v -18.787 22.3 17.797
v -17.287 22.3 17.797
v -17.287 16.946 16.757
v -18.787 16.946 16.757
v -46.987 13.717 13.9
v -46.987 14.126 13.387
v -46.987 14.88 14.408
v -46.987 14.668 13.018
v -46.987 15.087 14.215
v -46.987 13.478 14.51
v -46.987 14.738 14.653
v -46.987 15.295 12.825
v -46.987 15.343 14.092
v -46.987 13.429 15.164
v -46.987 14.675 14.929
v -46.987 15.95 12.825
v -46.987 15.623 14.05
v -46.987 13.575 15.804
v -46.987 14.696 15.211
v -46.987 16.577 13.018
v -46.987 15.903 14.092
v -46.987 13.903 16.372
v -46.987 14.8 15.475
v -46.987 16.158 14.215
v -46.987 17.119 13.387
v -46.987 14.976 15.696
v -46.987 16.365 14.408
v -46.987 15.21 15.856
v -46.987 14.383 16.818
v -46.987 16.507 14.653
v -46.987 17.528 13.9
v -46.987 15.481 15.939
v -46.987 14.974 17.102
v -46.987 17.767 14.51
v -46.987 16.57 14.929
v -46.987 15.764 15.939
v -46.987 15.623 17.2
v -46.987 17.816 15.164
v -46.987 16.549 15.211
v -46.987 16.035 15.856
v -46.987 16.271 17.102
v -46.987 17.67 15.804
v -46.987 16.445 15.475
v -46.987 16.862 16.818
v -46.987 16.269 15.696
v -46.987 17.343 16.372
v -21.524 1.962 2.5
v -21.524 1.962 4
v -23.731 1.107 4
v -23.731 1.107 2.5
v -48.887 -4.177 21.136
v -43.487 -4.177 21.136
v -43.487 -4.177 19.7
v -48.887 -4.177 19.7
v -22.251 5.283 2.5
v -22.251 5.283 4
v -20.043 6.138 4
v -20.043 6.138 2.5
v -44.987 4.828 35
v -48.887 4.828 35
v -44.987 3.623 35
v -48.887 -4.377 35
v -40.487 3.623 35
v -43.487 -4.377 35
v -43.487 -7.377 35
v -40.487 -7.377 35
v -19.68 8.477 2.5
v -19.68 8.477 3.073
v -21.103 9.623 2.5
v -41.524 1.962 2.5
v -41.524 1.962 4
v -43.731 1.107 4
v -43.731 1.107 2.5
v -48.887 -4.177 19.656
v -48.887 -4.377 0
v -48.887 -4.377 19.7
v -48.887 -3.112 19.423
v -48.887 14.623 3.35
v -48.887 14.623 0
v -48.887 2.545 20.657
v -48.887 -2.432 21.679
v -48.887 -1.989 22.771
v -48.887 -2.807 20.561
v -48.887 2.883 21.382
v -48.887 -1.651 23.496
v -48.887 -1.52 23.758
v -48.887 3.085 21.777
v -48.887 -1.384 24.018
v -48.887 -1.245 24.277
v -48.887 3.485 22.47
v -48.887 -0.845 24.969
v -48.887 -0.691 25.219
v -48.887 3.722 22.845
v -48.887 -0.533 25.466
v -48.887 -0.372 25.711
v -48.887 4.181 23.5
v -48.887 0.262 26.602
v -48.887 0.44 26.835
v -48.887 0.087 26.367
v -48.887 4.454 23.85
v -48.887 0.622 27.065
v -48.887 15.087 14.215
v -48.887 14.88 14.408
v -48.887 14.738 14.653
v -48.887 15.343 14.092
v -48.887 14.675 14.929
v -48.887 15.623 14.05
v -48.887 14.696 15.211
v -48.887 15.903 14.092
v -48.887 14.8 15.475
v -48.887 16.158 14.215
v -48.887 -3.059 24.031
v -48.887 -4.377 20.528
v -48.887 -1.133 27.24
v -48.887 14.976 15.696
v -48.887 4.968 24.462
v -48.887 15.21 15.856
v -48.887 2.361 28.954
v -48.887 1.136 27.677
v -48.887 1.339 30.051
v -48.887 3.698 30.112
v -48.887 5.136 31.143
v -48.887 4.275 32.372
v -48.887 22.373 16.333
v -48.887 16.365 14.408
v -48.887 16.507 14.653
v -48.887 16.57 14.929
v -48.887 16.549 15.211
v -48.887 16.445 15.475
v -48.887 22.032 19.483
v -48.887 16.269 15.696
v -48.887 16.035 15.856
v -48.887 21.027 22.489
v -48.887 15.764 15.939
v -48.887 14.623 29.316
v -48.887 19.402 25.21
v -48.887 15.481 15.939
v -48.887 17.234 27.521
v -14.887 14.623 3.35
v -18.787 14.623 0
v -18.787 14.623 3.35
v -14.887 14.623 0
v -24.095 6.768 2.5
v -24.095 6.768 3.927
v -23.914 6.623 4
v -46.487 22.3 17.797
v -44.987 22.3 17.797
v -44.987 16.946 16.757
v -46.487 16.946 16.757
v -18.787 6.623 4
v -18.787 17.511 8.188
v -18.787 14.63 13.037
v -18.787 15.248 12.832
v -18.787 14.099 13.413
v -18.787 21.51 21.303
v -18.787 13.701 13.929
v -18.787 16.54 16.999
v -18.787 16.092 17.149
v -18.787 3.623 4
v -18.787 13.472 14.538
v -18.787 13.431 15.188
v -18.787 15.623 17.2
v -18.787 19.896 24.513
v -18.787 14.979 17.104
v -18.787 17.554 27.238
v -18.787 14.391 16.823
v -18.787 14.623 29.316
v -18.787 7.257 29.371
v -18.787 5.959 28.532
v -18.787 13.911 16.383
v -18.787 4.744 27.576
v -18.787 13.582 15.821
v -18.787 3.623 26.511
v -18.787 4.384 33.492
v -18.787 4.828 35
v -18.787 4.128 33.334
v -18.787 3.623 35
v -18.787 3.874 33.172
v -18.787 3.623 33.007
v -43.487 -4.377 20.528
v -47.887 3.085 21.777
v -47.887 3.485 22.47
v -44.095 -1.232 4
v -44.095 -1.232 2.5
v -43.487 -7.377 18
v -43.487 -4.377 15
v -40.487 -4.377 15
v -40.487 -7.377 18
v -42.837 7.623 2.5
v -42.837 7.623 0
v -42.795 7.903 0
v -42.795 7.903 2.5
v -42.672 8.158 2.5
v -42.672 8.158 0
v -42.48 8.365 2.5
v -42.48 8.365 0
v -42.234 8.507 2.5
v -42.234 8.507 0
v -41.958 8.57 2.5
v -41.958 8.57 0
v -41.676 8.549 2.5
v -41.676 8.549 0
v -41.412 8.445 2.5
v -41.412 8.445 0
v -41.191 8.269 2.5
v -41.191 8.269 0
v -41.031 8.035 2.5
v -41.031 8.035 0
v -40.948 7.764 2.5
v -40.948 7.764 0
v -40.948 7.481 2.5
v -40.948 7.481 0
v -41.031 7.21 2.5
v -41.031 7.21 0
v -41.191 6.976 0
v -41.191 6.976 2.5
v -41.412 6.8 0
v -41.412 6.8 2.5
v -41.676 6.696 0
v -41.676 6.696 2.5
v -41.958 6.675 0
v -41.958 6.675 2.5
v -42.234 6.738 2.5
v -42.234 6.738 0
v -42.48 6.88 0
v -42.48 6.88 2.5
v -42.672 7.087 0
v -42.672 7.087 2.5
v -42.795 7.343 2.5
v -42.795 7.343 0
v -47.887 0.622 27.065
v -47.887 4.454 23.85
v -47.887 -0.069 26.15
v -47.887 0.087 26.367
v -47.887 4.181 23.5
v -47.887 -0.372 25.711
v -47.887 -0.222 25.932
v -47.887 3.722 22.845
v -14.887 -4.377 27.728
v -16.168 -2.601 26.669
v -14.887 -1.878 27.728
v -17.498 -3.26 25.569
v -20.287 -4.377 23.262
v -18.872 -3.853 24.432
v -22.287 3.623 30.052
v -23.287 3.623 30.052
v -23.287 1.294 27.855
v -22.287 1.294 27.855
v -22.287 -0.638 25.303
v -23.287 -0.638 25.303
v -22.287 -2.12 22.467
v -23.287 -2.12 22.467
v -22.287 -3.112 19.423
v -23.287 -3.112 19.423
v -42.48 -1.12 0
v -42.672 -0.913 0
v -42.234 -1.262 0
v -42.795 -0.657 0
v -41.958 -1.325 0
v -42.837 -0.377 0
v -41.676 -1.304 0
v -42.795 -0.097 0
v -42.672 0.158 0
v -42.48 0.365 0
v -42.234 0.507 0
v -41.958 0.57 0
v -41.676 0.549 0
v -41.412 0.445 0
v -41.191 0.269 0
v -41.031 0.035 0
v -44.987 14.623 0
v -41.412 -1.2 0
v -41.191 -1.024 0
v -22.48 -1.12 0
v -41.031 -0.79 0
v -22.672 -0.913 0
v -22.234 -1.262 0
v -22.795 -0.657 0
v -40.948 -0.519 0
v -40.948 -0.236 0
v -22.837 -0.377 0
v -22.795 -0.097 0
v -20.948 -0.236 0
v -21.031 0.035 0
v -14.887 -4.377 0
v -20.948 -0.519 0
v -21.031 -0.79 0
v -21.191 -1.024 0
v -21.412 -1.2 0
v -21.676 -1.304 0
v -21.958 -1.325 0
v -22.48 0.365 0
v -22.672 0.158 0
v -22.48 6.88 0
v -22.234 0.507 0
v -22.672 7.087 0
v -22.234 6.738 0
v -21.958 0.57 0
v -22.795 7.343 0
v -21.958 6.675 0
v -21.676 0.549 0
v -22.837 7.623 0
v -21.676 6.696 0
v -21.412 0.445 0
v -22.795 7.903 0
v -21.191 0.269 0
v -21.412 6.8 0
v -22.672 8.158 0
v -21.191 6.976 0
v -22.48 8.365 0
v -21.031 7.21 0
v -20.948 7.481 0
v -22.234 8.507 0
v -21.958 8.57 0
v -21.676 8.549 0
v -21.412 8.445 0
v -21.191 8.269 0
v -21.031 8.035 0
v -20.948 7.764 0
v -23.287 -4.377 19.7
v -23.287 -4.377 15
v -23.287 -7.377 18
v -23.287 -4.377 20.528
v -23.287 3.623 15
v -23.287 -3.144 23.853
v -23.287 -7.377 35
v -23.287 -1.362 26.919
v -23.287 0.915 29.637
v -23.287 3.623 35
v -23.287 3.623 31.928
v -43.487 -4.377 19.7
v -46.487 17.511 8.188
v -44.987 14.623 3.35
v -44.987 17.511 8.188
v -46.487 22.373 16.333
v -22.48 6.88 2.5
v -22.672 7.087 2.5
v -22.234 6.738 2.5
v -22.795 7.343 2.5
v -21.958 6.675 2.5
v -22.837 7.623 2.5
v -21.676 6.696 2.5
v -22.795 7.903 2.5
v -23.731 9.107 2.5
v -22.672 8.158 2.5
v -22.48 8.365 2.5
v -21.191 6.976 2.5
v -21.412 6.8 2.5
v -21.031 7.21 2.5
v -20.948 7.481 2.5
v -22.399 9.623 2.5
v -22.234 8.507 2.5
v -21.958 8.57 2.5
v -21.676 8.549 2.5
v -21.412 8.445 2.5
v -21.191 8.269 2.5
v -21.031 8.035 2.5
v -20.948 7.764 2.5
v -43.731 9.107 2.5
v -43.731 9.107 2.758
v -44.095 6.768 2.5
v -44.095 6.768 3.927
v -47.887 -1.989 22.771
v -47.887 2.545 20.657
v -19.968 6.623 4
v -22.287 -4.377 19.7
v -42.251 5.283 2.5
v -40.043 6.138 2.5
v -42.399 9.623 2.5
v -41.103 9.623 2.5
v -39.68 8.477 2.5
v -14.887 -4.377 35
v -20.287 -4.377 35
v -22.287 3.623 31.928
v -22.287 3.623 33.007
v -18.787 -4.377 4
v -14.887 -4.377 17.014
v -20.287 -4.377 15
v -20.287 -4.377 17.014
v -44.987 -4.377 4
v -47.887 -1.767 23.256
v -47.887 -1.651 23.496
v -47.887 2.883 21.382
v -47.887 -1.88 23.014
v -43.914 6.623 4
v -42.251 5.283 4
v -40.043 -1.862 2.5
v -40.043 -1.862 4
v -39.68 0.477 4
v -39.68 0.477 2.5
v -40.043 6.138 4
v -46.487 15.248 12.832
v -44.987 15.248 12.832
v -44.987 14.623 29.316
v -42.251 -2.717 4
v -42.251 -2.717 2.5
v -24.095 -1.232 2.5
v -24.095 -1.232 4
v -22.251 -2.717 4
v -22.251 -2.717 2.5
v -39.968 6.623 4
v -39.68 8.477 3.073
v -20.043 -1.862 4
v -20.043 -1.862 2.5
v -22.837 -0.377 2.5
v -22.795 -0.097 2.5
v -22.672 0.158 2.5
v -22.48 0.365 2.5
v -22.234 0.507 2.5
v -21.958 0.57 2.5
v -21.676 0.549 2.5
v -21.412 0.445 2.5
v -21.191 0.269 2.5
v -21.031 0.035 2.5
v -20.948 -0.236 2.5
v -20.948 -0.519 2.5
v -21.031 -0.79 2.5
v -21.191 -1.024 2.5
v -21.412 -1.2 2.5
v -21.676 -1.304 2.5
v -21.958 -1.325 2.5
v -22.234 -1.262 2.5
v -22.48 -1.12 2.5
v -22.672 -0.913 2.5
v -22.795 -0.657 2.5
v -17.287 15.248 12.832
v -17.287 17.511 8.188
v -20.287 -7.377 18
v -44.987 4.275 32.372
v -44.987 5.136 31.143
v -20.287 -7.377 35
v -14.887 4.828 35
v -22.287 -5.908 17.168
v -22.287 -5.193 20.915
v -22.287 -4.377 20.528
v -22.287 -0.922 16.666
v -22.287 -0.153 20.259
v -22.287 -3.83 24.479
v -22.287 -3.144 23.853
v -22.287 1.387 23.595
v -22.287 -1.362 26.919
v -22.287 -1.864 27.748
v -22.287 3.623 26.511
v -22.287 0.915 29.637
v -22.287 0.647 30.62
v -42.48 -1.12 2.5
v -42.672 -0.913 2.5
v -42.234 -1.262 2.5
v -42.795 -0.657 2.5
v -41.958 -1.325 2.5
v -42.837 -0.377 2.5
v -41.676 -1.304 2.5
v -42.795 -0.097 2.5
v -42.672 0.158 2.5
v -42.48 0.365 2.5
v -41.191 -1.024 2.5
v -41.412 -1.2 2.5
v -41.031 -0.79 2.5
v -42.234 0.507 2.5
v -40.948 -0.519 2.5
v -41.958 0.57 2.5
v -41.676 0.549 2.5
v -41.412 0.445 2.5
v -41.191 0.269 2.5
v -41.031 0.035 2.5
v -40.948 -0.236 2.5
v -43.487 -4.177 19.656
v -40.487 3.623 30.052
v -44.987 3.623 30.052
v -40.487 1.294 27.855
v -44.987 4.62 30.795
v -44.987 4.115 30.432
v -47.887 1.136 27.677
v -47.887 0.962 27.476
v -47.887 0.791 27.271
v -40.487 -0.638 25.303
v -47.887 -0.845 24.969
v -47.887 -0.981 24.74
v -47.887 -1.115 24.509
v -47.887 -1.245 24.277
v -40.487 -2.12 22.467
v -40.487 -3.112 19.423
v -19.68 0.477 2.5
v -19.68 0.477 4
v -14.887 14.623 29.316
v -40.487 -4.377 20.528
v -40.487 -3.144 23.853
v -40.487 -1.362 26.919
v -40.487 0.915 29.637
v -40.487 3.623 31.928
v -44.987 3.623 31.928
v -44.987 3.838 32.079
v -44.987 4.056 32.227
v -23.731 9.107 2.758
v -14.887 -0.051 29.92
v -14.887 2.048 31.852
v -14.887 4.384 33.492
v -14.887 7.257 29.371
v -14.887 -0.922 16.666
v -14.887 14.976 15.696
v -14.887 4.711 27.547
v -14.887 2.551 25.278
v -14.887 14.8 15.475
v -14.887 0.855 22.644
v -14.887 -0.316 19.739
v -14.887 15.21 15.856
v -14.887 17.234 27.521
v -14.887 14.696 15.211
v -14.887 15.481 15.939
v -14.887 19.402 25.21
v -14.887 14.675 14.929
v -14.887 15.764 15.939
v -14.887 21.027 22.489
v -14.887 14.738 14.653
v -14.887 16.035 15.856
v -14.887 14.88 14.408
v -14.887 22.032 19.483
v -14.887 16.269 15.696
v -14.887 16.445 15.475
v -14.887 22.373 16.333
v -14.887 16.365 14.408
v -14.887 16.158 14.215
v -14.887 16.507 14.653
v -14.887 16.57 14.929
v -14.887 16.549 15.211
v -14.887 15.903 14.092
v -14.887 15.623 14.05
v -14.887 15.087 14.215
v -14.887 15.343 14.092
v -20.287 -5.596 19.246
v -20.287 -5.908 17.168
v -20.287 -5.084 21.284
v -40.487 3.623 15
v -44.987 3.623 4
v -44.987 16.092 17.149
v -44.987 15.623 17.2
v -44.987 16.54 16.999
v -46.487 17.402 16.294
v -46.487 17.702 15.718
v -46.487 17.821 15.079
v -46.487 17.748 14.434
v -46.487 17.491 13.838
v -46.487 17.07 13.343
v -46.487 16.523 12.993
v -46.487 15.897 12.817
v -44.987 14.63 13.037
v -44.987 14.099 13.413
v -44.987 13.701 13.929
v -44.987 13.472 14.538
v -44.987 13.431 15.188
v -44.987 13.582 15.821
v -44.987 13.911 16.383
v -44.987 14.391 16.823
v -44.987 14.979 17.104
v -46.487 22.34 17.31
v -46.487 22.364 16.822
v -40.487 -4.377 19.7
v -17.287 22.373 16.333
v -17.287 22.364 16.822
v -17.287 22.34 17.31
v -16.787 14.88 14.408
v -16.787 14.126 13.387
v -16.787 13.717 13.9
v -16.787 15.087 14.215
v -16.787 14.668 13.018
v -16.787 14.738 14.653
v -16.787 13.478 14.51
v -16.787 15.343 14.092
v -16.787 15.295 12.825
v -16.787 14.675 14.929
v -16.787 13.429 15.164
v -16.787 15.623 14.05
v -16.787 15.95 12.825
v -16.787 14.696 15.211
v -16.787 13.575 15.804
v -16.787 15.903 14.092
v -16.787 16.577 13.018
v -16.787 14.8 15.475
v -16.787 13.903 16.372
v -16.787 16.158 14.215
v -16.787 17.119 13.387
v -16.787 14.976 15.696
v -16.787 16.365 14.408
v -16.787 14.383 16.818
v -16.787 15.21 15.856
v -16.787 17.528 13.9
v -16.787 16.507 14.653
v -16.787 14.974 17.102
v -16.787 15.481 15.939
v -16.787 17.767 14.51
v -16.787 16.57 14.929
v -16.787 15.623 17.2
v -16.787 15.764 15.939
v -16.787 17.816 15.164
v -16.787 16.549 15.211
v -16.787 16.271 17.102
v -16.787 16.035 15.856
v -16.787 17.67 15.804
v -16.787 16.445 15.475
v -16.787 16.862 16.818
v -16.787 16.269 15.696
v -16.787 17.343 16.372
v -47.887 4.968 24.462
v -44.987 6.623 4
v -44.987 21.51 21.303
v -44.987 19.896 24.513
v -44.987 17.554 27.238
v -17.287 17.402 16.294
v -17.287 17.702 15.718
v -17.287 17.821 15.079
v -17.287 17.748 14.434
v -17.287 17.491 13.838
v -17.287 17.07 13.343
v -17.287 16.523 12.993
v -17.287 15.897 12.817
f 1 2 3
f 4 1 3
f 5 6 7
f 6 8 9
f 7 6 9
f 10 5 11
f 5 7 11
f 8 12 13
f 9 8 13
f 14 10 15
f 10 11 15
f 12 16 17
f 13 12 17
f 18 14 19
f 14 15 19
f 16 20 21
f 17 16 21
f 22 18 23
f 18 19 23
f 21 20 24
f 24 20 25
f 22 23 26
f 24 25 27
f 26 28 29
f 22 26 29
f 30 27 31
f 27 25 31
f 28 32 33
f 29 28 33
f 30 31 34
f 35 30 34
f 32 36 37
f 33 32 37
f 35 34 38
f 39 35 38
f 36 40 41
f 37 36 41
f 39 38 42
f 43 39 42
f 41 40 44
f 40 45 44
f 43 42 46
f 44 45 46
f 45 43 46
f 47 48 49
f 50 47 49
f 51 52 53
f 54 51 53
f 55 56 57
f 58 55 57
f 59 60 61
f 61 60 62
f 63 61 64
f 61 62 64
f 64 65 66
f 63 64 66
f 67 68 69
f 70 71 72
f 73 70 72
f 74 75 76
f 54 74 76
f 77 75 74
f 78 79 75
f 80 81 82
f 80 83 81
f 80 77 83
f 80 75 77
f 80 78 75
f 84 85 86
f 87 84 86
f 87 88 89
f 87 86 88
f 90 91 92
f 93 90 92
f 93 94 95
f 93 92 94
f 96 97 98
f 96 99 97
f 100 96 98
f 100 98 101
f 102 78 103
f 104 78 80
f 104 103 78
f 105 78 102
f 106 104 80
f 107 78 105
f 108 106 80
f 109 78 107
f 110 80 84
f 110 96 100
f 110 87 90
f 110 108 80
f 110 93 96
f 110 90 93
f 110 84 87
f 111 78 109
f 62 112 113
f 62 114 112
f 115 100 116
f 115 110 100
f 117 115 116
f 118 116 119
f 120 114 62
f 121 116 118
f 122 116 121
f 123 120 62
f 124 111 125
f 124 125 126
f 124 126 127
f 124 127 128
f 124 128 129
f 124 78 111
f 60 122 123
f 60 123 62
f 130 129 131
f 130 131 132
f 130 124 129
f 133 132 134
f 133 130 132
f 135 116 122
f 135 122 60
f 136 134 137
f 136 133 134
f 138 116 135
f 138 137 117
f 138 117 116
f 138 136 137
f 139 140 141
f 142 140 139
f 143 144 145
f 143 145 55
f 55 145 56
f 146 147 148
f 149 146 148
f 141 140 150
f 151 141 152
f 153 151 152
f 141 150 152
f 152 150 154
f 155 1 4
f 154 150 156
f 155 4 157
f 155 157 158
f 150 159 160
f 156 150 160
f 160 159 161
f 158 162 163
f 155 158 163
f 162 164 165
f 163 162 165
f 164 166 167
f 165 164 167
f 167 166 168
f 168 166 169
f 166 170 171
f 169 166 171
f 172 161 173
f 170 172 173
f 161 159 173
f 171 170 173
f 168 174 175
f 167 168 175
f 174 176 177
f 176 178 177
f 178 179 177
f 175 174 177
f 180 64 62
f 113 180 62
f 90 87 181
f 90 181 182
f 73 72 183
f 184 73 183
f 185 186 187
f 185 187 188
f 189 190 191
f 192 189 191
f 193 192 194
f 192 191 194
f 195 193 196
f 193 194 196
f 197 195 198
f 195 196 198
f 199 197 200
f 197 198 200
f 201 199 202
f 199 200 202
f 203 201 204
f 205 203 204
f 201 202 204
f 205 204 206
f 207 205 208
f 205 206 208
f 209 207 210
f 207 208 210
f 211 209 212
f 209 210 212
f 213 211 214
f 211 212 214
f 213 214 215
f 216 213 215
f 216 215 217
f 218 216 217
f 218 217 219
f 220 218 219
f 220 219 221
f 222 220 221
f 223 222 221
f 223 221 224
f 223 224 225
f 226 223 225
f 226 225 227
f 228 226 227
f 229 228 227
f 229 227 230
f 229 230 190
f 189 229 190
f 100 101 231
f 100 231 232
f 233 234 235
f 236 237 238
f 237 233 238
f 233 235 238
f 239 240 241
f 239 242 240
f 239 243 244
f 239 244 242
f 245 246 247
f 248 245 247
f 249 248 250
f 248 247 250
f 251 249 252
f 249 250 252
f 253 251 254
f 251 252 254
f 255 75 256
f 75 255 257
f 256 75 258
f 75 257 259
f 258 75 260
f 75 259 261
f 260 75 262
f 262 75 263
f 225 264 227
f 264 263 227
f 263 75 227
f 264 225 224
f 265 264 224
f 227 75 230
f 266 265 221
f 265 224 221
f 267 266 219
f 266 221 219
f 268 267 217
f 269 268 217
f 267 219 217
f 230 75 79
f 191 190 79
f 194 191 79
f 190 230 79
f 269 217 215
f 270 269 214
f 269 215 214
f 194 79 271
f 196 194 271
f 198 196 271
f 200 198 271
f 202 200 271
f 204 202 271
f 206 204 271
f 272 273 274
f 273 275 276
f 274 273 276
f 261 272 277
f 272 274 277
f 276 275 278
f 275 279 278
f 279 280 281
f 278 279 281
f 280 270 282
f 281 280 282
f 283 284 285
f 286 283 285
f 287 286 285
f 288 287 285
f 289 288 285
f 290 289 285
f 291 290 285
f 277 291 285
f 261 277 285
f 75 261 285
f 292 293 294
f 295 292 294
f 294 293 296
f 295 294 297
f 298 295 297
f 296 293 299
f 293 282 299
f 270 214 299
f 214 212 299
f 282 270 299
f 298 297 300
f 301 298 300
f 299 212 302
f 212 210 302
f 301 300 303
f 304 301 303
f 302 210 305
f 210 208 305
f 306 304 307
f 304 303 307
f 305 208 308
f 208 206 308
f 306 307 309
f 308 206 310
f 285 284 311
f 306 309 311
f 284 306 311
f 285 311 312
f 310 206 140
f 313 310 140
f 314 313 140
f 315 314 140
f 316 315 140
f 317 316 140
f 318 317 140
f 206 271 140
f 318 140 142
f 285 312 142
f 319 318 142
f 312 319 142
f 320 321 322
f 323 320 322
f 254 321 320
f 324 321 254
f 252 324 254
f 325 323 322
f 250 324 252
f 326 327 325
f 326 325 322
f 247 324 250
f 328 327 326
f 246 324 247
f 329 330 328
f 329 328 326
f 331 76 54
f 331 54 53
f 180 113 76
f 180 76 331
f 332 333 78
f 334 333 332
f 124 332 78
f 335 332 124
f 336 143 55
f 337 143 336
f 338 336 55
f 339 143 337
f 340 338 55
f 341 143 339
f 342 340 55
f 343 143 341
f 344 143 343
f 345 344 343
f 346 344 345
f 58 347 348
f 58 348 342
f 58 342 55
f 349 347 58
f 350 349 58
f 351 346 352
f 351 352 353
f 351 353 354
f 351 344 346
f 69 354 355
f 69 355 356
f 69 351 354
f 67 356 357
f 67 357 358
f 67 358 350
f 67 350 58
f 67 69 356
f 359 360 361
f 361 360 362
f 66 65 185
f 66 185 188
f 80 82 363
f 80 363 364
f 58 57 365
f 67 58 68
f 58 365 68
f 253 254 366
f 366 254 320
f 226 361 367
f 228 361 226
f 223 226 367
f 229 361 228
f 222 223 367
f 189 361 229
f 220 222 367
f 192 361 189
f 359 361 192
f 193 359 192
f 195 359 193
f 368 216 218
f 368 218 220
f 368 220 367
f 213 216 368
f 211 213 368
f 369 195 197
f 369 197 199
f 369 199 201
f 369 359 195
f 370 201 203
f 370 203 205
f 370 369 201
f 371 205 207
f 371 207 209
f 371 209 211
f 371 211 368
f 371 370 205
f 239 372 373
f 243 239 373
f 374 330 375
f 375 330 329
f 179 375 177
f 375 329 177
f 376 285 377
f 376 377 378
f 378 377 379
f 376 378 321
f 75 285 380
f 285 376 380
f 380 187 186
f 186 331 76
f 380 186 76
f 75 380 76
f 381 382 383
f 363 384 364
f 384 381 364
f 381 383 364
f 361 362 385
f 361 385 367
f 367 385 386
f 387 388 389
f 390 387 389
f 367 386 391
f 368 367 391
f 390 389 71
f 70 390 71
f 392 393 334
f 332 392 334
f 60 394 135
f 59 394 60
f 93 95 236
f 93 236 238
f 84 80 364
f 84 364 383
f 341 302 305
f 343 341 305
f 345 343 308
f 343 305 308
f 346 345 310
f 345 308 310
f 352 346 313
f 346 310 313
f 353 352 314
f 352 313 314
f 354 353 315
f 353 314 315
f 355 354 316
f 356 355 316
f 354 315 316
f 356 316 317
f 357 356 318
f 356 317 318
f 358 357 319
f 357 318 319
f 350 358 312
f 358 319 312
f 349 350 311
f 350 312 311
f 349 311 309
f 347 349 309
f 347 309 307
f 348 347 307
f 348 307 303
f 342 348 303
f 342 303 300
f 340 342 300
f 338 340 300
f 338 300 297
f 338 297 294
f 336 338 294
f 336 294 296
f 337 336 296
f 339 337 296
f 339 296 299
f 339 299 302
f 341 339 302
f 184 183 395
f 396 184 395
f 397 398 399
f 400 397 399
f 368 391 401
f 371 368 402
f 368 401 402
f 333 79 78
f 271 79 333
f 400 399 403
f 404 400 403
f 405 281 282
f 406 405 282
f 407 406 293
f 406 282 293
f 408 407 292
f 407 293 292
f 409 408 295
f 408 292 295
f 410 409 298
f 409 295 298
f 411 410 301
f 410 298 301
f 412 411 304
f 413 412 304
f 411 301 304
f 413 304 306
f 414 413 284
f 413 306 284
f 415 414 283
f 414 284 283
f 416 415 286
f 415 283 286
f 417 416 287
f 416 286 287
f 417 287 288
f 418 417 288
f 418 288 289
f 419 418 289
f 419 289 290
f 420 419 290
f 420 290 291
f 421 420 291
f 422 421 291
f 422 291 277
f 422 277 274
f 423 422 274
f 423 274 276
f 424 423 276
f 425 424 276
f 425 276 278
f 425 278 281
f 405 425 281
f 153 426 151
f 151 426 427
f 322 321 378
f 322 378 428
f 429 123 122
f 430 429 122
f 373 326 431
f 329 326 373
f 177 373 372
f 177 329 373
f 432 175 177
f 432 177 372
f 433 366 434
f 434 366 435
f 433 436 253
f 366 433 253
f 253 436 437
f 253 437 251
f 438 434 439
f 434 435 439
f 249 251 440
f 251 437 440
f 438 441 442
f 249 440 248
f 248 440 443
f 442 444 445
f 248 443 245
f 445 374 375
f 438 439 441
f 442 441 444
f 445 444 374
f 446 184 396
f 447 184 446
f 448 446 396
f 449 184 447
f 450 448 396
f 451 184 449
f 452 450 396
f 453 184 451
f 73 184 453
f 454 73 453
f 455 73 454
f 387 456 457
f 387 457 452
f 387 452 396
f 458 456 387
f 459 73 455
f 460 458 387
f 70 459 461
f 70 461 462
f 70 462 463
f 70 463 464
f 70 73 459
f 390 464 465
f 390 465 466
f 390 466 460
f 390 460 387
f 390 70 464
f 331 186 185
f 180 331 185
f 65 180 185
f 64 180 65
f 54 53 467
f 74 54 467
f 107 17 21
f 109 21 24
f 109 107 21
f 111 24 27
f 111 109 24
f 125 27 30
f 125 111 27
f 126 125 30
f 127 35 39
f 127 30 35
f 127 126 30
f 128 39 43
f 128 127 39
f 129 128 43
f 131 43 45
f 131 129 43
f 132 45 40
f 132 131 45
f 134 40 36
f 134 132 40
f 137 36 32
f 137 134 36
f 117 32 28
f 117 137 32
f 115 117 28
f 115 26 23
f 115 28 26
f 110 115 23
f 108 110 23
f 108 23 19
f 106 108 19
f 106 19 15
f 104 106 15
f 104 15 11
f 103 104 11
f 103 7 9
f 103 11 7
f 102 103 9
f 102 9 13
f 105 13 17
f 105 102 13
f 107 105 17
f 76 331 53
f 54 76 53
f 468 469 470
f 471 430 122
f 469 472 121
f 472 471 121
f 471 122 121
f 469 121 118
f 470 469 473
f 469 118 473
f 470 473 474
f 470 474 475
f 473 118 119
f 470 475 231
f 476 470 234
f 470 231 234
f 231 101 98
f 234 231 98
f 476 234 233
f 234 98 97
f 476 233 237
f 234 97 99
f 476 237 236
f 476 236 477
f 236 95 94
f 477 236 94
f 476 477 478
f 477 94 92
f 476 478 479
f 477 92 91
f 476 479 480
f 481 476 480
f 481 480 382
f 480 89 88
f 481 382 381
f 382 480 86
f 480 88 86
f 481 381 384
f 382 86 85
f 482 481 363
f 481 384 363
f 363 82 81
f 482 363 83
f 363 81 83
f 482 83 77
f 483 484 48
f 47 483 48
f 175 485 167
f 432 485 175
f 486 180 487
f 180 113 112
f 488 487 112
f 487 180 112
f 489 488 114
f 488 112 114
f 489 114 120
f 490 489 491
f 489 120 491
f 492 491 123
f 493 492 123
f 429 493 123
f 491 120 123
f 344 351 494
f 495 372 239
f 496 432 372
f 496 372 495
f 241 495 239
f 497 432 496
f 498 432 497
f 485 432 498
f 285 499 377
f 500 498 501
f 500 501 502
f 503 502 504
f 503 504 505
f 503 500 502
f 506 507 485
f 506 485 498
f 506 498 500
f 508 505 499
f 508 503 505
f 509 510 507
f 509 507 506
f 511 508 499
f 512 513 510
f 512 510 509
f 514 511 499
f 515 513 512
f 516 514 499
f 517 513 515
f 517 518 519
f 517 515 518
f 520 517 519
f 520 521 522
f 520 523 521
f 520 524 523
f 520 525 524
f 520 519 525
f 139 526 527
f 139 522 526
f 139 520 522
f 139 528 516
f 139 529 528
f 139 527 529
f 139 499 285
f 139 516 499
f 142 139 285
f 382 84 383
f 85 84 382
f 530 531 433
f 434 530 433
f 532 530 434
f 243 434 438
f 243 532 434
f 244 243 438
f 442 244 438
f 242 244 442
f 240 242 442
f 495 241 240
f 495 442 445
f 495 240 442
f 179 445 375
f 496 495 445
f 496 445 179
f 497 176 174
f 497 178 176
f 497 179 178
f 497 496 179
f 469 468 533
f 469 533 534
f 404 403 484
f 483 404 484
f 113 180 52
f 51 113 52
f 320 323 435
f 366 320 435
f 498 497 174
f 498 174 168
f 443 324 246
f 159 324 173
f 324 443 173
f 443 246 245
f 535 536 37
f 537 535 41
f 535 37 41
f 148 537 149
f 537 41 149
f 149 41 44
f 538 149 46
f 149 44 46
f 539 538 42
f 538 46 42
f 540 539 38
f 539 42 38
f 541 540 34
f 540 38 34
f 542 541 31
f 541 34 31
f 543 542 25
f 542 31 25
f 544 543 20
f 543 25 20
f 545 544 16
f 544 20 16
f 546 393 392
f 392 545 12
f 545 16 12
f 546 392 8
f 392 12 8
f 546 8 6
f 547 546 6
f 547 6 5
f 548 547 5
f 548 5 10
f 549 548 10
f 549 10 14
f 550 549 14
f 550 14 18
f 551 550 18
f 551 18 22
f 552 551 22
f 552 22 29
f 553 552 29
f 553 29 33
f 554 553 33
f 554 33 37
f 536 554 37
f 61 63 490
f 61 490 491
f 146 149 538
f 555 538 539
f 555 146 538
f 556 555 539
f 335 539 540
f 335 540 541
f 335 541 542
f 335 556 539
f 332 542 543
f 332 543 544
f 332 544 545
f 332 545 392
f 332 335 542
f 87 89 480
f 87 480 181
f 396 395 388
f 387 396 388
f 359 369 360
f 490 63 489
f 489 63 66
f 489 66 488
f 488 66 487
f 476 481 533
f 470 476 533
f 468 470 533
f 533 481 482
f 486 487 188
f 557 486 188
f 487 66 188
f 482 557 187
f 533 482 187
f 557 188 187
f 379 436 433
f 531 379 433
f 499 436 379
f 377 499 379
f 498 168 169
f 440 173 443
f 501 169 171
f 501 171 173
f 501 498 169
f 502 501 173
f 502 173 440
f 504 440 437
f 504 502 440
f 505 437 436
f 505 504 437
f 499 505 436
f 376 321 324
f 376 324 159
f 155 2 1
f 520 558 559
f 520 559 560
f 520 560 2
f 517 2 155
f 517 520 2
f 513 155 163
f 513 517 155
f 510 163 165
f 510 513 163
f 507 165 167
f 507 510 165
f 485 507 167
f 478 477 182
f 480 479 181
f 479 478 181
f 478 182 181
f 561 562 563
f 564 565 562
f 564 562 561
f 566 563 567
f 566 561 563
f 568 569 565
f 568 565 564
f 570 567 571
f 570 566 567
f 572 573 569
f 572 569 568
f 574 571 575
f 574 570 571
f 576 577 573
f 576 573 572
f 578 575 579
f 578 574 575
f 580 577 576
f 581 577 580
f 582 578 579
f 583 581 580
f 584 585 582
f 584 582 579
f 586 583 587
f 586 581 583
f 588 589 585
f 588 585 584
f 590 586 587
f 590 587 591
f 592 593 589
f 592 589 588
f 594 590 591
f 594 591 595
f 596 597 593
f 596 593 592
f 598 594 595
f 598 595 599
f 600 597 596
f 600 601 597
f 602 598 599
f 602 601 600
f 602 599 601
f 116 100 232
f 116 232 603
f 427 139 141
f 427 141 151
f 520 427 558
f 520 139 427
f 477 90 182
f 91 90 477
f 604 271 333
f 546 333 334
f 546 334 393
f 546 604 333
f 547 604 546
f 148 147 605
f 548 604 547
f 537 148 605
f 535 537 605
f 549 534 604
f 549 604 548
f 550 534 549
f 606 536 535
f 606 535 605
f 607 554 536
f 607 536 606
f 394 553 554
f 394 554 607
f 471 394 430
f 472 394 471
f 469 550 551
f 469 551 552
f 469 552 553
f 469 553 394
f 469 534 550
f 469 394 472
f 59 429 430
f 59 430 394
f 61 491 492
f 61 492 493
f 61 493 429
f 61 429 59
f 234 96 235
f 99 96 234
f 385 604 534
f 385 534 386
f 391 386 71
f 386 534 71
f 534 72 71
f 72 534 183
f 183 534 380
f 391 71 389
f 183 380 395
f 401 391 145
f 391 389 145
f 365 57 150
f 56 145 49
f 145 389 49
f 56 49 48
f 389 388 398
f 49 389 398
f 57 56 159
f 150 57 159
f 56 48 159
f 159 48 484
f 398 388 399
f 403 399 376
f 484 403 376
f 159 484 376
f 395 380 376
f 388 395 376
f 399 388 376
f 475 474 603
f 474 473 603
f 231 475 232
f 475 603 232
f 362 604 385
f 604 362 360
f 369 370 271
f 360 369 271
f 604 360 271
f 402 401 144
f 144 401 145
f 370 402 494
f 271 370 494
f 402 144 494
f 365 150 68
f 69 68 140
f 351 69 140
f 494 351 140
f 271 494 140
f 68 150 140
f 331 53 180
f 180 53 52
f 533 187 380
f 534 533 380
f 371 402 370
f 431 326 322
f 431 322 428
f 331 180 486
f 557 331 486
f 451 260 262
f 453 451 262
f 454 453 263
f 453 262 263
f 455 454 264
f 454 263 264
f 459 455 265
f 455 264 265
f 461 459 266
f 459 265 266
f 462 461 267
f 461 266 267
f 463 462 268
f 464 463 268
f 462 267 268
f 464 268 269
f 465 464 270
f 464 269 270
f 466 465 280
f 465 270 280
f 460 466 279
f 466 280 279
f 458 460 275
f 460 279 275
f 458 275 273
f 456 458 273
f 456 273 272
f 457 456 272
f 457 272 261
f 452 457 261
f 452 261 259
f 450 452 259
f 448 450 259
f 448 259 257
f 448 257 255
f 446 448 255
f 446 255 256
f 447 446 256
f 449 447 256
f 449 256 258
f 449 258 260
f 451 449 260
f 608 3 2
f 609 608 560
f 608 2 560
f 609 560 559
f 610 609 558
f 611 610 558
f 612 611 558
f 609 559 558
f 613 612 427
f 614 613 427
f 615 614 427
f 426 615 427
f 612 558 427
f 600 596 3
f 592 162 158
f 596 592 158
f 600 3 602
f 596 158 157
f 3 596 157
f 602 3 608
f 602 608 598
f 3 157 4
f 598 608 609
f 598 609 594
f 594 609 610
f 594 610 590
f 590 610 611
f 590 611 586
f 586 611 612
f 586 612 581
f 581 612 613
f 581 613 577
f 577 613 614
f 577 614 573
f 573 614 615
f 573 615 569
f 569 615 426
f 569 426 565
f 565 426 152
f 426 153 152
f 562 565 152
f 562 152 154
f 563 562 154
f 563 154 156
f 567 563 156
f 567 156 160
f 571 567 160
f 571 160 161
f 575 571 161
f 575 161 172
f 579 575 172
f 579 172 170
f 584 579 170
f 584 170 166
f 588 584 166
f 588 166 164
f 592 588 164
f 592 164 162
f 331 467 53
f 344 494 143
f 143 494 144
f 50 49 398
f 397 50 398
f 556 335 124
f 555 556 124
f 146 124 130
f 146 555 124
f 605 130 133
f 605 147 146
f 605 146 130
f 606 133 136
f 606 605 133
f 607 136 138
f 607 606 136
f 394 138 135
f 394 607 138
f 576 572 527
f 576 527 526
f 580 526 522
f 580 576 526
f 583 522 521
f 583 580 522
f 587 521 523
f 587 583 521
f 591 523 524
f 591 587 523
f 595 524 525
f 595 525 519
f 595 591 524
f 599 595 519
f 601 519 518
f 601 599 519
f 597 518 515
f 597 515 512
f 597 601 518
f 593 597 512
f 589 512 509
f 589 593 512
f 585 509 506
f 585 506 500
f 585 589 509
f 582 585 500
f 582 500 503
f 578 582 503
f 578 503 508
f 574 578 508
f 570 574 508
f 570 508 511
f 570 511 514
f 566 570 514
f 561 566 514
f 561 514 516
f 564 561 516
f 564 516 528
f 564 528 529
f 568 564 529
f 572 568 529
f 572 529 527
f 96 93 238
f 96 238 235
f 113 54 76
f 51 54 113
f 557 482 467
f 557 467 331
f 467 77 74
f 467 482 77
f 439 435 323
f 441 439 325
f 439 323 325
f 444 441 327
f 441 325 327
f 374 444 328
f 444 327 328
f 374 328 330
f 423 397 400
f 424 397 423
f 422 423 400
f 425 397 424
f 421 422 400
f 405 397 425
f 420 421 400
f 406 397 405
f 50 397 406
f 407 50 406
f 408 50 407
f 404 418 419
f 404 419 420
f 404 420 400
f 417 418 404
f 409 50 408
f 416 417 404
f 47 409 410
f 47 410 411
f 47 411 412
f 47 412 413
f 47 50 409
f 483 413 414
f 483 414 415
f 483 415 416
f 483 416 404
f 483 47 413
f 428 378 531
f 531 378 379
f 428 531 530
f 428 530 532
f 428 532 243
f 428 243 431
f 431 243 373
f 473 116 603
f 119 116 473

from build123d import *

# Parameters (mm, degrees)
CROQUIS1_W                = 34
CROQUIS1_H                = 19
SALIENTE_EXTRUIR1_DEPTH   = 35
CROQUIS2_W                = 26.2
CROQUIS2_H                = 31
CORTAR_EXTRUIR1_DEPTH     = 25
CORTAR_EXTRUIR3_DEPTH     = 26.2
SALIENTE_EXTRUIR2_DEPTH   = 34
CROQUIS10_W               = 26.2
CROQUIS10_H               = 25.966324345
CORTAR_EXTRUIR4_DEPTH     = 10
CROQUIS18_R               = 0.95
CORTAR_EXTRUIR11_DEPTH    = 4
CORTAR_EXTRUIR12_DEPTH    = 1.5
CORTAR_EXTRUIR14_START    = -34
CROQUIS21_R               = 0.95
CORTAR_EXTRUIR14_DEPTH    = 34
SALIENTE_EXTRUIR3_DEPTH   = 8
CORTAR_EXTRUIR16_START    = -34
CORTAR_EXTRUIR16_DEPTH    = 34
CROQUIS25_W               = 3
CROQUIS25_H               = 20
SALIENTE_EXTRUIR4_DEPTH   = 3
CORTAR_EXTRUIR17_START    = -23.2
CORTAR_EXTRUIR17_DEPTH    = 23.2
CORTAR_EXTRUIR18_DEPTH    = 7.4
CORTAR_EXTRUIR20_START    = -1.5
CORTAR_EXTRUIR20_DEPTH    = 1.5
CORTAR_EXTRUIR21_DEPTH    = 27.7
CORTAR_EXTRUIR22_START    = -34
CORTAR_EXTRUIR22_DEPTH    = 34
CROQUIS33_W               = 5.4
CROQUIS33_H               = 0.827388273
SALIENTE_EXTRUIR5_DEPTH   = 0.2
SALIENTE_EXTRUIR6_START   = -5.4
SALIENTE_EXTRUIR6_DEPTH   = 5.4
SALIENTE_EXTRUIR6_2_DEPTH = 5.4
CORTAR_EXTRUIR23_DEPTH    = 3
CROQUIS36_R               = 2.2
CORTAR_EXTRUIR24_DEPTH    = 2
CORTAR_EXTRUIR25_START    = 28.2
CROQUIS36_2_R             = 2.2
CORTAR_EXTRUIR25_DEPTH    = 28.2
CORTAR_EXTRUIR26_START    = -34
CORTAR_EXTRUIR26_DEPTH    = 34
CORTAR_EXTRUIR27_DEPTH    = 1


# Read off the part's stored shape, not the designer's step: Saliente-Extruir6
with BuildPart() as part:
    # Croquis1 → Saliente-Extruir1 (new body)
    with BuildSketch(Plane.XY):
        with Locations((-31.887263086, 5.12254902)):
            Rectangle(CROQUIS1_W, CROQUIS1_H)
    extrude(amount=SALIENTE_EXTRUIR1_DEPTH)

    # Croquis2 → Cortar-Extruir1 (cut)
    with BuildSketch(Plane.XZ.offset(4.37745098)):
        with Locations((-31.887263086, 19.5)):
            Rectangle(CROQUIS2_W, CROQUIS2_H)
    extrude(amount=-CORTAR_EXTRUIR1_DEPTH, mode=Mode.SUBTRACT)

    # Croquis4 → Cortar-Extruir3 (cut)
    with BuildSketch(Plane.ZY.offset(18.787263086)):
        Polygon((4, 14.62254902), (4, 6.62254902), (0, 14.62254902), align=None)
    extrude(amount=CORTAR_EXTRUIR3_DEPTH, mode=Mode.SUBTRACT)

    # Croquis9 → Saliente-Extruir2 (add)
    with BuildSketch(Plane(origin=(-14.887263086, 0, 0), x_dir=(0, 0, -1), z_dir=(1, 0, 0))):
        with BuildLine():
            Line((-29.315831827, 14.62254902), (-3.349507482, 14.62254902))
            ThreePointArc((-3.349507482, 14.62254902), (-16.332669655, 22.37254902), (-29.315831827, 14.62254902))
        make_face()
    extrude(amount=-SALIENTE_EXTRUIR2_DEPTH)

    # Croquis10 → Cortar-Extruir4 (cut)
    with BuildSketch(Plane.XZ.offset(-14.62254902)):
        with Locations((-31.887263086, 16.332669655)):
            Rectangle(CROQUIS10_W, CROQUIS10_H)
    extrude(amount=-CORTAR_EXTRUIR4_DEPTH, mode=Mode.SUBTRACT)

    # Croquis18 → Cortar-Extruir11 (cut)
    with BuildSketch(Plane(origin=(0, 0, 0), x_dir=(-1, 0, 0), z_dir=(0, 0, -1))):
        with Locations((41.887263086, -0.37745098)):
            Circle(CROQUIS18_R)
        with Locations((21.887263086, -0.37745098)):
            Circle(CROQUIS18_R)
        with Locations((21.887263086, 7.62254902)):
            Circle(CROQUIS18_R)
        with Locations((41.887263086, 7.62254902)):
            Circle(CROQUIS18_R)
    extrude(amount=-CORTAR_EXTRUIR11_DEPTH, mode=Mode.SUBTRACT)

    # Croquis19 → Cortar-Extruir12 (cut)
    with BuildSketch(Plane.XY.offset(4)):
        Polygon((-43.731270866, 1.106789108), (-44.094656598, -1.232288518), (-42.250648818, -2.716528607), (-40.043255306, -1.861691069), (-39.679869573, 0.477386558), (-41.523877353, 1.961626646), align=None)
        Polygon((-23.731270866, 1.106789108), (-24.094656598, -1.232288518), (-22.250648818, -2.716528607), (-20.043255306, -1.861691069), (-19.679869573, 0.477386558), (-21.523877353, 1.961626646), align=None)
        Polygon((-43.731270866, 9.106789108), (-44.094656598, 6.767711482), (-42.250648818, 5.283471393), (-40.043255306, 6.138308931), (-39.679869573, 8.477386558), (-41.523877353, 9.961626646), align=None)
        Polygon((-23.731270866, 9.106789108), (-24.094656598, 6.767711482), (-22.250648818, 5.283471393), (-20.043255306, 6.138308931), (-19.679869573, 8.477386558), (-21.523877353, 9.961626646), align=None)
    extrude(amount=-CORTAR_EXTRUIR12_DEPTH, mode=Mode.SUBTRACT)

    # Croquis21 → Cortar-Extruir14 (cut)
    with BuildSketch(Plane(origin=(-14.887263086, 0, 0), x_dir=(0, 0, -1), z_dir=(1, 0, 0)).offset(CORTAR_EXTRUIR14_START)):
        with Locations((-15, 15.62254902)):
            Circle(CROQUIS21_R)
    extrude(amount=CORTAR_EXTRUIR14_DEPTH, mode=Mode.SUBTRACT)

    # Croquis23 → Saliente-Extruir3 (add)
    with BuildSketch(Plane.XZ.offset(4.37745098)):
        Polygon((-44.987263086, 35), (-40.487263086, 35), (-40.487263086, 15), (-44.987263086, 4), align=None)
        Polygon((-18.787263086, 35), (-23.287263086, 35), (-23.287263086, 15), (-18.787263086, 4), align=None)
    extrude(amount=-SALIENTE_EXTRUIR3_DEPTH)

    # Croquis24 → Cortar-Extruir16 (cut)
    with BuildSketch(Plane(origin=(-14.887263086, 0, 0), x_dir=(0, 0, -1), z_dir=(1, 0, 0)).offset(CORTAR_EXTRUIR16_START)):
        with BuildLine():
            Line((-19.423271375, -3.112369457), (-19.744087704, -4.577660174))
            ThreePointArc((-19.744087704, -4.577660174), (-26.911270078, -1.367932572), (-32.372332418, 4.275439874))
            Line((-32.372332418, 4.275439874), (-31.142668885, 5.135569413))
            ThreePointArc((-31.142668885, 5.135569413), (-26.079106399, -0.119620507), (-19.423271375, -3.112369457))
        make_face()
    extrude(amount=CORTAR_EXTRUIR16_DEPTH, mode=Mode.SUBTRACT)

    # Croquis25 → Saliente-Extruir4 (add)
    with BuildSketch(Plane.XZ.offset(4.37745098)):
        with Locations((-21.787263086, 25)):
            Rectangle(CROQUIS25_W, CROQUIS25_H)
        with Locations((-41.987263086, 25)):
            Rectangle(CROQUIS25_W, CROQUIS25_H)
    extrude(amount=SALIENTE_EXTRUIR4_DEPTH)

    # Croquis26 → Cortar-Extruir17 (cut)
    with BuildSketch(Plane(origin=(-20.287263086, 0, 0), x_dir=(0, 0, -1), z_dir=(1, 0, 0)).offset(CORTAR_EXTRUIR17_START)):
        Polygon((-18, -7.37745098), (-15, -7.37745098), (-15, -4.37745098), align=None)
    extrude(amount=CORTAR_EXTRUIR17_DEPTH, mode=Mode.SUBTRACT)

    # Croquis27 → Cortar-Extruir18 (cut)
    with BuildSketch(Plane(origin=(-14.887263086, 0, 0), x_dir=(0, 0, -1), z_dir=(1, 0, 0))):
        with BuildLine():
            Line((-16.665899018, -0.922309645), (-17.167910976, -5.908036155))
            ThreePointArc((-17.167910976, -5.908036155), (-26.540732538, -2.68257126), (-33.492032026, 4.383746258))
            Line((-33.492032026, 4.383746258), (-29.371216121, 7.25740019))
            ThreePointArc((-29.371216121, 7.25740019), (-24.001343163, 1.641011586), (-16.665899018, -0.922309645))
        make_face()
    extrude(amount=-CORTAR_EXTRUIR18_DEPTH, mode=Mode.SUBTRACT)

    # Croquis29 → Cortar-Extruir20 (cut)
    with BuildSketch(Plane.ZY.offset(18.787263086).offset(CORTAR_EXTRUIR20_START)):
        with BuildLine():
            Line((17.797402962, 22.299641931), (16.5, 15.62254902))
            ThreePointArc((16.5, 15.62254902), (15.426958984, 14.184596995), (13.743058632, 14.803953638))
            Line((13.743058632, 14.803953638), (6.296886003, 18.432060872))
            ThreePointArc((6.296886003, 18.432060872), (11.631045274, 21.603150873), (17.797402962, 22.299641931))
        make_face()
    extrude(amount=CORTAR_EXTRUIR20_DEPTH, mode=Mode.SUBTRACT)

    # Croquis29<2> → Cortar-Extruir21 (cut)
    with BuildSketch(Plane.ZY.offset(18.787263086)):
        with BuildLine():
            Line((17.797402962, 22.299641931), (16.5, 15.62254902))
            ThreePointArc((16.5, 15.62254902), (15.426958984, 14.184596995), (13.743058632, 14.803953638))
            Line((13.743058632, 14.803953638), (6.296886003, 18.432060872))
            ThreePointArc((6.296886003, 18.432060872), (11.631045274, 21.603150873), (17.797402962, 22.299641931))
        make_face()
    extrude(amount=CORTAR_EXTRUIR21_DEPTH, mode=Mode.SUBTRACT)

    # Croquis30 → Cortar-Extruir22 (cut)
    with BuildSketch(Plane.ZY.offset(48.887263086).offset(CORTAR_EXTRUIR22_START)):
        Polygon((29.315831827, 14.62254902), (35, 4.827802707), (35, 14.62254902), align=None)
    extrude(amount=CORTAR_EXTRUIR22_DEPTH, mode=Mode.SUBTRACT)

    # Saliente-Extruir6 2 outline → Saliente-Extruir6 2 (add)
    with BuildSketch(Plane.ZY.offset(48.887263086).offset(SALIENTE_EXTRUIR6_START)):
        Polygon((19.700253141, -4.37745098), (19.700253141, -4.17745098), (19.656464379, -4.17745098), align=None)
    extrude(amount=SALIENTE_EXTRUIR6_2_DEPTH)

    # Croquis35 → Cortar-Extruir23 (cut)
    with BuildSketch(Plane.XZ.offset(4.37745098)):
        Polygon((-20.287263086, 23.262320252), (-14.887263086, 27.727784977), (-14.887263086, 23.262320252), align=None)
    extrude(amount=-CORTAR_EXTRUIR23_DEPTH, mode=Mode.SUBTRACT)

    # Croquis36 → Cortar-Extruir24 (cut)
    with BuildSketch(Plane.ZY.offset(18.787263086)):
        with Locations((15, 15.62254902)):
            Circle(CROQUIS36_R)
    extrude(amount=-CORTAR_EXTRUIR24_DEPTH, mode=Mode.SUBTRACT)

    # Croquis36<2> → Cortar-Extruir25 (cut)
    with BuildSketch(Plane.ZY.offset(18.787263086).offset(CORTAR_EXTRUIR25_START)):
        with Locations((15, 15.62254902)):
            Circle(CROQUIS36_2_R)
    extrude(amount=-CORTAR_EXTRUIR25_DEPTH, mode=Mode.SUBTRACT)

    # Croquis38 → Cortar-Extruir26 (cut)
    with BuildSketch(Plane.ZY.offset(48.887263086).offset(CORTAR_EXTRUIR26_START)):
        Polygon((3.349507482, 14.62254902), (16.332669655, 22.37254902), (3.349507482, 22.37254902), align=None)
    extrude(amount=CORTAR_EXTRUIR26_DEPTH, mode=Mode.SUBTRACT)

    # Croquis40 → Cortar-Extruir27 (cut)
    with BuildSketch(Plane.ZY.offset(48.887263086)):
        Polygon((24.462469518, 4.967906508), (27.804965088, 0.984475403), (27.192129534, 0.470245316), (23.849633963, 4.45367642), align=None)
        Polygon((23.499956861, 4.180731289), (26.48255433, -0.078859342), (25.827232695, -0.537720491), (22.844635226, 3.72187014), align=None)
        Polygon((22.469633136, 3.484764914), (25.069633136, -1.018567186), (24.376812813, -1.418567186), (21.776812813, 3.084764914), align=None)
        Polygon((21.381853505, 2.883100647), (23.579468466, -1.829699846), (22.854422236, -2.167794455), (20.656807275, 2.545006037), align=None)
    extrude(amount=-CORTAR_EXTRUIR27_DEPTH, mode=Mode.SUBTRACT)


with BuildPart() as body_2:
    # Croquis33 → Saliente-Extruir5 (new body)
    with BuildSketch(Plane.XZ.offset(4.37745098)):
        with Locations((-46.187263086, 20.113947278)):
            Rectangle(CROQUIS33_W, CROQUIS33_H)
    extrude(amount=-SALIENTE_EXTRUIR5_DEPTH)

    # Saliente-Extruir6 outline → Saliente-Extruir6 (add)
    with BuildSketch(Plane.ZY.offset(48.887263086).offset(SALIENTE_EXTRUIR6_START)):
        Polygon((21.135776638, -4.17745098), (20.527641414, -4.17745098), (20.527641414, -4.37745098), align=None)
    extrude(amount=SALIENTE_EXTRUIR6_DEPTH)


solid = Compound([part.part, body_2.part])
